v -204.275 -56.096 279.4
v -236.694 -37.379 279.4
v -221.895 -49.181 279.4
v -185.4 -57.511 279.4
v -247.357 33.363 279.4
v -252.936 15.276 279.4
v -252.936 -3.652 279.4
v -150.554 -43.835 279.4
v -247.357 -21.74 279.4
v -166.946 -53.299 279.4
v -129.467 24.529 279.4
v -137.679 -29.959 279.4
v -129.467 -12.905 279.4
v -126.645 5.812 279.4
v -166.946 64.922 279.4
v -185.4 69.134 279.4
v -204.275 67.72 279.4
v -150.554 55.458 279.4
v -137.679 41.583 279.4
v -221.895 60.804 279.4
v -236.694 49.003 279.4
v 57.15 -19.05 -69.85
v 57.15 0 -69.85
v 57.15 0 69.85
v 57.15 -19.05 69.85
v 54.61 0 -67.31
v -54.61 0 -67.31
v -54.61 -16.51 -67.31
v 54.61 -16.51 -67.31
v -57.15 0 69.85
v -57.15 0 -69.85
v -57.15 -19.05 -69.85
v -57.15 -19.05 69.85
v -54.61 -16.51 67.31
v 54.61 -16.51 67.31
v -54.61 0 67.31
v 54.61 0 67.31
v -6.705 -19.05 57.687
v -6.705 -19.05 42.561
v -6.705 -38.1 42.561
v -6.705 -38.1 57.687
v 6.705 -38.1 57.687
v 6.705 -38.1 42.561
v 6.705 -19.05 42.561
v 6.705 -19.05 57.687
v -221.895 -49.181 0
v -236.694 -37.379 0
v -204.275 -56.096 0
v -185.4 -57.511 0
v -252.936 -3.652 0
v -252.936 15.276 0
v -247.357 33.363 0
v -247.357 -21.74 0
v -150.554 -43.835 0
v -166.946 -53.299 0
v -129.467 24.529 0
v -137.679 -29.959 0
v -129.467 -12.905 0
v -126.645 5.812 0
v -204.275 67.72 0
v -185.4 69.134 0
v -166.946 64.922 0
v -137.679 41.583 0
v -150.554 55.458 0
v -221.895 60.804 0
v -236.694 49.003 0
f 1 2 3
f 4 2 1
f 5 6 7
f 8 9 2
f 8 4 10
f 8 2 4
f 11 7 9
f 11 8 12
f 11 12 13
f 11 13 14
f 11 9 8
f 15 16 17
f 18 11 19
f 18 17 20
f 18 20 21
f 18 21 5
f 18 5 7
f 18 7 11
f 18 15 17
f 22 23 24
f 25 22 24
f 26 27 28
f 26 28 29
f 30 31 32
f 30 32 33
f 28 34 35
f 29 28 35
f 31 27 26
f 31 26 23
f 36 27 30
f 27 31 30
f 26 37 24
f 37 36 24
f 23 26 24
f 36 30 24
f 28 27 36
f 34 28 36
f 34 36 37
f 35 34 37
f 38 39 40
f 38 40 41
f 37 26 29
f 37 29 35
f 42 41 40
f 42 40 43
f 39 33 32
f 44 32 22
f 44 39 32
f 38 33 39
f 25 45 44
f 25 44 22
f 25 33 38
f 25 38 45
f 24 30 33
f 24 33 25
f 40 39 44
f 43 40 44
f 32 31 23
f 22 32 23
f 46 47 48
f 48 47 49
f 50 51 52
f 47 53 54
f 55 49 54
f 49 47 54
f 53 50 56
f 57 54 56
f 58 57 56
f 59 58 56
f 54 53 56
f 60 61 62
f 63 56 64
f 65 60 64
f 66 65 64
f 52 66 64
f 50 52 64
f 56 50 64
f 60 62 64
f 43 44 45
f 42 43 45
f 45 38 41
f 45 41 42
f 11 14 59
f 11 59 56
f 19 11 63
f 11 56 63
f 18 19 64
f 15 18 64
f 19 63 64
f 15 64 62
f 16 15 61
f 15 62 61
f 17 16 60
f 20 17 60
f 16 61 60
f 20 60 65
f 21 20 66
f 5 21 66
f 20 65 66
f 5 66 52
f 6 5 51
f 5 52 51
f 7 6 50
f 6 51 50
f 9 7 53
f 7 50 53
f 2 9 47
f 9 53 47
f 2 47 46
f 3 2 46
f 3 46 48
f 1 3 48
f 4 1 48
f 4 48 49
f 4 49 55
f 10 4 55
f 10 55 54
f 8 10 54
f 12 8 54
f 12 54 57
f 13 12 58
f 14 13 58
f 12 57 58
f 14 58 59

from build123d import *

# Parameters (mm, degrees)
F0_W     = 114.3
F0_H     = 139.7
F1_DEPTH = 19.05
F2_T     = -2.54
F4_START = 19.05
F3_W     = 13.4108727798
F3_H     = 15.1262134314
F4_DEPTH = 19.05
F5_R     = 63.5
F6_DEPTH = 279.4


with BuildPart() as f1:
    # F0 (on Front) → F1 (new body)
    with BuildSketch(Plane.XZ):
        Rectangle(F0_W, F0_H)
    extrude(amount=F1_DEPTH)

    # F2
    f2_openings = [f1.faces().sort_by_distance(p)[0] for p in [
        (0, 0, 0),
    ]]
    offset(amount=F2_T, openings=f2_openings)

    # F3 (on Front) → F4 (join)
    with BuildSketch(Plane.XZ.offset(F4_START)):
        with Locations((0, 50.1240901649)):
            Rectangle(F3_W, F3_H)
    extrude(amount=F4_DEPTH)


with BuildPart() as f6:
    # F5 (on Top) → F6 (new body)
    with BuildSketch(Plane.XY):
        with Locations((-190.1454031467, 5.8117690496)):
            Circle(F5_R)
    extrude(amount=F6_DEPTH)


solid = Compound([f1.part, f6.part])
